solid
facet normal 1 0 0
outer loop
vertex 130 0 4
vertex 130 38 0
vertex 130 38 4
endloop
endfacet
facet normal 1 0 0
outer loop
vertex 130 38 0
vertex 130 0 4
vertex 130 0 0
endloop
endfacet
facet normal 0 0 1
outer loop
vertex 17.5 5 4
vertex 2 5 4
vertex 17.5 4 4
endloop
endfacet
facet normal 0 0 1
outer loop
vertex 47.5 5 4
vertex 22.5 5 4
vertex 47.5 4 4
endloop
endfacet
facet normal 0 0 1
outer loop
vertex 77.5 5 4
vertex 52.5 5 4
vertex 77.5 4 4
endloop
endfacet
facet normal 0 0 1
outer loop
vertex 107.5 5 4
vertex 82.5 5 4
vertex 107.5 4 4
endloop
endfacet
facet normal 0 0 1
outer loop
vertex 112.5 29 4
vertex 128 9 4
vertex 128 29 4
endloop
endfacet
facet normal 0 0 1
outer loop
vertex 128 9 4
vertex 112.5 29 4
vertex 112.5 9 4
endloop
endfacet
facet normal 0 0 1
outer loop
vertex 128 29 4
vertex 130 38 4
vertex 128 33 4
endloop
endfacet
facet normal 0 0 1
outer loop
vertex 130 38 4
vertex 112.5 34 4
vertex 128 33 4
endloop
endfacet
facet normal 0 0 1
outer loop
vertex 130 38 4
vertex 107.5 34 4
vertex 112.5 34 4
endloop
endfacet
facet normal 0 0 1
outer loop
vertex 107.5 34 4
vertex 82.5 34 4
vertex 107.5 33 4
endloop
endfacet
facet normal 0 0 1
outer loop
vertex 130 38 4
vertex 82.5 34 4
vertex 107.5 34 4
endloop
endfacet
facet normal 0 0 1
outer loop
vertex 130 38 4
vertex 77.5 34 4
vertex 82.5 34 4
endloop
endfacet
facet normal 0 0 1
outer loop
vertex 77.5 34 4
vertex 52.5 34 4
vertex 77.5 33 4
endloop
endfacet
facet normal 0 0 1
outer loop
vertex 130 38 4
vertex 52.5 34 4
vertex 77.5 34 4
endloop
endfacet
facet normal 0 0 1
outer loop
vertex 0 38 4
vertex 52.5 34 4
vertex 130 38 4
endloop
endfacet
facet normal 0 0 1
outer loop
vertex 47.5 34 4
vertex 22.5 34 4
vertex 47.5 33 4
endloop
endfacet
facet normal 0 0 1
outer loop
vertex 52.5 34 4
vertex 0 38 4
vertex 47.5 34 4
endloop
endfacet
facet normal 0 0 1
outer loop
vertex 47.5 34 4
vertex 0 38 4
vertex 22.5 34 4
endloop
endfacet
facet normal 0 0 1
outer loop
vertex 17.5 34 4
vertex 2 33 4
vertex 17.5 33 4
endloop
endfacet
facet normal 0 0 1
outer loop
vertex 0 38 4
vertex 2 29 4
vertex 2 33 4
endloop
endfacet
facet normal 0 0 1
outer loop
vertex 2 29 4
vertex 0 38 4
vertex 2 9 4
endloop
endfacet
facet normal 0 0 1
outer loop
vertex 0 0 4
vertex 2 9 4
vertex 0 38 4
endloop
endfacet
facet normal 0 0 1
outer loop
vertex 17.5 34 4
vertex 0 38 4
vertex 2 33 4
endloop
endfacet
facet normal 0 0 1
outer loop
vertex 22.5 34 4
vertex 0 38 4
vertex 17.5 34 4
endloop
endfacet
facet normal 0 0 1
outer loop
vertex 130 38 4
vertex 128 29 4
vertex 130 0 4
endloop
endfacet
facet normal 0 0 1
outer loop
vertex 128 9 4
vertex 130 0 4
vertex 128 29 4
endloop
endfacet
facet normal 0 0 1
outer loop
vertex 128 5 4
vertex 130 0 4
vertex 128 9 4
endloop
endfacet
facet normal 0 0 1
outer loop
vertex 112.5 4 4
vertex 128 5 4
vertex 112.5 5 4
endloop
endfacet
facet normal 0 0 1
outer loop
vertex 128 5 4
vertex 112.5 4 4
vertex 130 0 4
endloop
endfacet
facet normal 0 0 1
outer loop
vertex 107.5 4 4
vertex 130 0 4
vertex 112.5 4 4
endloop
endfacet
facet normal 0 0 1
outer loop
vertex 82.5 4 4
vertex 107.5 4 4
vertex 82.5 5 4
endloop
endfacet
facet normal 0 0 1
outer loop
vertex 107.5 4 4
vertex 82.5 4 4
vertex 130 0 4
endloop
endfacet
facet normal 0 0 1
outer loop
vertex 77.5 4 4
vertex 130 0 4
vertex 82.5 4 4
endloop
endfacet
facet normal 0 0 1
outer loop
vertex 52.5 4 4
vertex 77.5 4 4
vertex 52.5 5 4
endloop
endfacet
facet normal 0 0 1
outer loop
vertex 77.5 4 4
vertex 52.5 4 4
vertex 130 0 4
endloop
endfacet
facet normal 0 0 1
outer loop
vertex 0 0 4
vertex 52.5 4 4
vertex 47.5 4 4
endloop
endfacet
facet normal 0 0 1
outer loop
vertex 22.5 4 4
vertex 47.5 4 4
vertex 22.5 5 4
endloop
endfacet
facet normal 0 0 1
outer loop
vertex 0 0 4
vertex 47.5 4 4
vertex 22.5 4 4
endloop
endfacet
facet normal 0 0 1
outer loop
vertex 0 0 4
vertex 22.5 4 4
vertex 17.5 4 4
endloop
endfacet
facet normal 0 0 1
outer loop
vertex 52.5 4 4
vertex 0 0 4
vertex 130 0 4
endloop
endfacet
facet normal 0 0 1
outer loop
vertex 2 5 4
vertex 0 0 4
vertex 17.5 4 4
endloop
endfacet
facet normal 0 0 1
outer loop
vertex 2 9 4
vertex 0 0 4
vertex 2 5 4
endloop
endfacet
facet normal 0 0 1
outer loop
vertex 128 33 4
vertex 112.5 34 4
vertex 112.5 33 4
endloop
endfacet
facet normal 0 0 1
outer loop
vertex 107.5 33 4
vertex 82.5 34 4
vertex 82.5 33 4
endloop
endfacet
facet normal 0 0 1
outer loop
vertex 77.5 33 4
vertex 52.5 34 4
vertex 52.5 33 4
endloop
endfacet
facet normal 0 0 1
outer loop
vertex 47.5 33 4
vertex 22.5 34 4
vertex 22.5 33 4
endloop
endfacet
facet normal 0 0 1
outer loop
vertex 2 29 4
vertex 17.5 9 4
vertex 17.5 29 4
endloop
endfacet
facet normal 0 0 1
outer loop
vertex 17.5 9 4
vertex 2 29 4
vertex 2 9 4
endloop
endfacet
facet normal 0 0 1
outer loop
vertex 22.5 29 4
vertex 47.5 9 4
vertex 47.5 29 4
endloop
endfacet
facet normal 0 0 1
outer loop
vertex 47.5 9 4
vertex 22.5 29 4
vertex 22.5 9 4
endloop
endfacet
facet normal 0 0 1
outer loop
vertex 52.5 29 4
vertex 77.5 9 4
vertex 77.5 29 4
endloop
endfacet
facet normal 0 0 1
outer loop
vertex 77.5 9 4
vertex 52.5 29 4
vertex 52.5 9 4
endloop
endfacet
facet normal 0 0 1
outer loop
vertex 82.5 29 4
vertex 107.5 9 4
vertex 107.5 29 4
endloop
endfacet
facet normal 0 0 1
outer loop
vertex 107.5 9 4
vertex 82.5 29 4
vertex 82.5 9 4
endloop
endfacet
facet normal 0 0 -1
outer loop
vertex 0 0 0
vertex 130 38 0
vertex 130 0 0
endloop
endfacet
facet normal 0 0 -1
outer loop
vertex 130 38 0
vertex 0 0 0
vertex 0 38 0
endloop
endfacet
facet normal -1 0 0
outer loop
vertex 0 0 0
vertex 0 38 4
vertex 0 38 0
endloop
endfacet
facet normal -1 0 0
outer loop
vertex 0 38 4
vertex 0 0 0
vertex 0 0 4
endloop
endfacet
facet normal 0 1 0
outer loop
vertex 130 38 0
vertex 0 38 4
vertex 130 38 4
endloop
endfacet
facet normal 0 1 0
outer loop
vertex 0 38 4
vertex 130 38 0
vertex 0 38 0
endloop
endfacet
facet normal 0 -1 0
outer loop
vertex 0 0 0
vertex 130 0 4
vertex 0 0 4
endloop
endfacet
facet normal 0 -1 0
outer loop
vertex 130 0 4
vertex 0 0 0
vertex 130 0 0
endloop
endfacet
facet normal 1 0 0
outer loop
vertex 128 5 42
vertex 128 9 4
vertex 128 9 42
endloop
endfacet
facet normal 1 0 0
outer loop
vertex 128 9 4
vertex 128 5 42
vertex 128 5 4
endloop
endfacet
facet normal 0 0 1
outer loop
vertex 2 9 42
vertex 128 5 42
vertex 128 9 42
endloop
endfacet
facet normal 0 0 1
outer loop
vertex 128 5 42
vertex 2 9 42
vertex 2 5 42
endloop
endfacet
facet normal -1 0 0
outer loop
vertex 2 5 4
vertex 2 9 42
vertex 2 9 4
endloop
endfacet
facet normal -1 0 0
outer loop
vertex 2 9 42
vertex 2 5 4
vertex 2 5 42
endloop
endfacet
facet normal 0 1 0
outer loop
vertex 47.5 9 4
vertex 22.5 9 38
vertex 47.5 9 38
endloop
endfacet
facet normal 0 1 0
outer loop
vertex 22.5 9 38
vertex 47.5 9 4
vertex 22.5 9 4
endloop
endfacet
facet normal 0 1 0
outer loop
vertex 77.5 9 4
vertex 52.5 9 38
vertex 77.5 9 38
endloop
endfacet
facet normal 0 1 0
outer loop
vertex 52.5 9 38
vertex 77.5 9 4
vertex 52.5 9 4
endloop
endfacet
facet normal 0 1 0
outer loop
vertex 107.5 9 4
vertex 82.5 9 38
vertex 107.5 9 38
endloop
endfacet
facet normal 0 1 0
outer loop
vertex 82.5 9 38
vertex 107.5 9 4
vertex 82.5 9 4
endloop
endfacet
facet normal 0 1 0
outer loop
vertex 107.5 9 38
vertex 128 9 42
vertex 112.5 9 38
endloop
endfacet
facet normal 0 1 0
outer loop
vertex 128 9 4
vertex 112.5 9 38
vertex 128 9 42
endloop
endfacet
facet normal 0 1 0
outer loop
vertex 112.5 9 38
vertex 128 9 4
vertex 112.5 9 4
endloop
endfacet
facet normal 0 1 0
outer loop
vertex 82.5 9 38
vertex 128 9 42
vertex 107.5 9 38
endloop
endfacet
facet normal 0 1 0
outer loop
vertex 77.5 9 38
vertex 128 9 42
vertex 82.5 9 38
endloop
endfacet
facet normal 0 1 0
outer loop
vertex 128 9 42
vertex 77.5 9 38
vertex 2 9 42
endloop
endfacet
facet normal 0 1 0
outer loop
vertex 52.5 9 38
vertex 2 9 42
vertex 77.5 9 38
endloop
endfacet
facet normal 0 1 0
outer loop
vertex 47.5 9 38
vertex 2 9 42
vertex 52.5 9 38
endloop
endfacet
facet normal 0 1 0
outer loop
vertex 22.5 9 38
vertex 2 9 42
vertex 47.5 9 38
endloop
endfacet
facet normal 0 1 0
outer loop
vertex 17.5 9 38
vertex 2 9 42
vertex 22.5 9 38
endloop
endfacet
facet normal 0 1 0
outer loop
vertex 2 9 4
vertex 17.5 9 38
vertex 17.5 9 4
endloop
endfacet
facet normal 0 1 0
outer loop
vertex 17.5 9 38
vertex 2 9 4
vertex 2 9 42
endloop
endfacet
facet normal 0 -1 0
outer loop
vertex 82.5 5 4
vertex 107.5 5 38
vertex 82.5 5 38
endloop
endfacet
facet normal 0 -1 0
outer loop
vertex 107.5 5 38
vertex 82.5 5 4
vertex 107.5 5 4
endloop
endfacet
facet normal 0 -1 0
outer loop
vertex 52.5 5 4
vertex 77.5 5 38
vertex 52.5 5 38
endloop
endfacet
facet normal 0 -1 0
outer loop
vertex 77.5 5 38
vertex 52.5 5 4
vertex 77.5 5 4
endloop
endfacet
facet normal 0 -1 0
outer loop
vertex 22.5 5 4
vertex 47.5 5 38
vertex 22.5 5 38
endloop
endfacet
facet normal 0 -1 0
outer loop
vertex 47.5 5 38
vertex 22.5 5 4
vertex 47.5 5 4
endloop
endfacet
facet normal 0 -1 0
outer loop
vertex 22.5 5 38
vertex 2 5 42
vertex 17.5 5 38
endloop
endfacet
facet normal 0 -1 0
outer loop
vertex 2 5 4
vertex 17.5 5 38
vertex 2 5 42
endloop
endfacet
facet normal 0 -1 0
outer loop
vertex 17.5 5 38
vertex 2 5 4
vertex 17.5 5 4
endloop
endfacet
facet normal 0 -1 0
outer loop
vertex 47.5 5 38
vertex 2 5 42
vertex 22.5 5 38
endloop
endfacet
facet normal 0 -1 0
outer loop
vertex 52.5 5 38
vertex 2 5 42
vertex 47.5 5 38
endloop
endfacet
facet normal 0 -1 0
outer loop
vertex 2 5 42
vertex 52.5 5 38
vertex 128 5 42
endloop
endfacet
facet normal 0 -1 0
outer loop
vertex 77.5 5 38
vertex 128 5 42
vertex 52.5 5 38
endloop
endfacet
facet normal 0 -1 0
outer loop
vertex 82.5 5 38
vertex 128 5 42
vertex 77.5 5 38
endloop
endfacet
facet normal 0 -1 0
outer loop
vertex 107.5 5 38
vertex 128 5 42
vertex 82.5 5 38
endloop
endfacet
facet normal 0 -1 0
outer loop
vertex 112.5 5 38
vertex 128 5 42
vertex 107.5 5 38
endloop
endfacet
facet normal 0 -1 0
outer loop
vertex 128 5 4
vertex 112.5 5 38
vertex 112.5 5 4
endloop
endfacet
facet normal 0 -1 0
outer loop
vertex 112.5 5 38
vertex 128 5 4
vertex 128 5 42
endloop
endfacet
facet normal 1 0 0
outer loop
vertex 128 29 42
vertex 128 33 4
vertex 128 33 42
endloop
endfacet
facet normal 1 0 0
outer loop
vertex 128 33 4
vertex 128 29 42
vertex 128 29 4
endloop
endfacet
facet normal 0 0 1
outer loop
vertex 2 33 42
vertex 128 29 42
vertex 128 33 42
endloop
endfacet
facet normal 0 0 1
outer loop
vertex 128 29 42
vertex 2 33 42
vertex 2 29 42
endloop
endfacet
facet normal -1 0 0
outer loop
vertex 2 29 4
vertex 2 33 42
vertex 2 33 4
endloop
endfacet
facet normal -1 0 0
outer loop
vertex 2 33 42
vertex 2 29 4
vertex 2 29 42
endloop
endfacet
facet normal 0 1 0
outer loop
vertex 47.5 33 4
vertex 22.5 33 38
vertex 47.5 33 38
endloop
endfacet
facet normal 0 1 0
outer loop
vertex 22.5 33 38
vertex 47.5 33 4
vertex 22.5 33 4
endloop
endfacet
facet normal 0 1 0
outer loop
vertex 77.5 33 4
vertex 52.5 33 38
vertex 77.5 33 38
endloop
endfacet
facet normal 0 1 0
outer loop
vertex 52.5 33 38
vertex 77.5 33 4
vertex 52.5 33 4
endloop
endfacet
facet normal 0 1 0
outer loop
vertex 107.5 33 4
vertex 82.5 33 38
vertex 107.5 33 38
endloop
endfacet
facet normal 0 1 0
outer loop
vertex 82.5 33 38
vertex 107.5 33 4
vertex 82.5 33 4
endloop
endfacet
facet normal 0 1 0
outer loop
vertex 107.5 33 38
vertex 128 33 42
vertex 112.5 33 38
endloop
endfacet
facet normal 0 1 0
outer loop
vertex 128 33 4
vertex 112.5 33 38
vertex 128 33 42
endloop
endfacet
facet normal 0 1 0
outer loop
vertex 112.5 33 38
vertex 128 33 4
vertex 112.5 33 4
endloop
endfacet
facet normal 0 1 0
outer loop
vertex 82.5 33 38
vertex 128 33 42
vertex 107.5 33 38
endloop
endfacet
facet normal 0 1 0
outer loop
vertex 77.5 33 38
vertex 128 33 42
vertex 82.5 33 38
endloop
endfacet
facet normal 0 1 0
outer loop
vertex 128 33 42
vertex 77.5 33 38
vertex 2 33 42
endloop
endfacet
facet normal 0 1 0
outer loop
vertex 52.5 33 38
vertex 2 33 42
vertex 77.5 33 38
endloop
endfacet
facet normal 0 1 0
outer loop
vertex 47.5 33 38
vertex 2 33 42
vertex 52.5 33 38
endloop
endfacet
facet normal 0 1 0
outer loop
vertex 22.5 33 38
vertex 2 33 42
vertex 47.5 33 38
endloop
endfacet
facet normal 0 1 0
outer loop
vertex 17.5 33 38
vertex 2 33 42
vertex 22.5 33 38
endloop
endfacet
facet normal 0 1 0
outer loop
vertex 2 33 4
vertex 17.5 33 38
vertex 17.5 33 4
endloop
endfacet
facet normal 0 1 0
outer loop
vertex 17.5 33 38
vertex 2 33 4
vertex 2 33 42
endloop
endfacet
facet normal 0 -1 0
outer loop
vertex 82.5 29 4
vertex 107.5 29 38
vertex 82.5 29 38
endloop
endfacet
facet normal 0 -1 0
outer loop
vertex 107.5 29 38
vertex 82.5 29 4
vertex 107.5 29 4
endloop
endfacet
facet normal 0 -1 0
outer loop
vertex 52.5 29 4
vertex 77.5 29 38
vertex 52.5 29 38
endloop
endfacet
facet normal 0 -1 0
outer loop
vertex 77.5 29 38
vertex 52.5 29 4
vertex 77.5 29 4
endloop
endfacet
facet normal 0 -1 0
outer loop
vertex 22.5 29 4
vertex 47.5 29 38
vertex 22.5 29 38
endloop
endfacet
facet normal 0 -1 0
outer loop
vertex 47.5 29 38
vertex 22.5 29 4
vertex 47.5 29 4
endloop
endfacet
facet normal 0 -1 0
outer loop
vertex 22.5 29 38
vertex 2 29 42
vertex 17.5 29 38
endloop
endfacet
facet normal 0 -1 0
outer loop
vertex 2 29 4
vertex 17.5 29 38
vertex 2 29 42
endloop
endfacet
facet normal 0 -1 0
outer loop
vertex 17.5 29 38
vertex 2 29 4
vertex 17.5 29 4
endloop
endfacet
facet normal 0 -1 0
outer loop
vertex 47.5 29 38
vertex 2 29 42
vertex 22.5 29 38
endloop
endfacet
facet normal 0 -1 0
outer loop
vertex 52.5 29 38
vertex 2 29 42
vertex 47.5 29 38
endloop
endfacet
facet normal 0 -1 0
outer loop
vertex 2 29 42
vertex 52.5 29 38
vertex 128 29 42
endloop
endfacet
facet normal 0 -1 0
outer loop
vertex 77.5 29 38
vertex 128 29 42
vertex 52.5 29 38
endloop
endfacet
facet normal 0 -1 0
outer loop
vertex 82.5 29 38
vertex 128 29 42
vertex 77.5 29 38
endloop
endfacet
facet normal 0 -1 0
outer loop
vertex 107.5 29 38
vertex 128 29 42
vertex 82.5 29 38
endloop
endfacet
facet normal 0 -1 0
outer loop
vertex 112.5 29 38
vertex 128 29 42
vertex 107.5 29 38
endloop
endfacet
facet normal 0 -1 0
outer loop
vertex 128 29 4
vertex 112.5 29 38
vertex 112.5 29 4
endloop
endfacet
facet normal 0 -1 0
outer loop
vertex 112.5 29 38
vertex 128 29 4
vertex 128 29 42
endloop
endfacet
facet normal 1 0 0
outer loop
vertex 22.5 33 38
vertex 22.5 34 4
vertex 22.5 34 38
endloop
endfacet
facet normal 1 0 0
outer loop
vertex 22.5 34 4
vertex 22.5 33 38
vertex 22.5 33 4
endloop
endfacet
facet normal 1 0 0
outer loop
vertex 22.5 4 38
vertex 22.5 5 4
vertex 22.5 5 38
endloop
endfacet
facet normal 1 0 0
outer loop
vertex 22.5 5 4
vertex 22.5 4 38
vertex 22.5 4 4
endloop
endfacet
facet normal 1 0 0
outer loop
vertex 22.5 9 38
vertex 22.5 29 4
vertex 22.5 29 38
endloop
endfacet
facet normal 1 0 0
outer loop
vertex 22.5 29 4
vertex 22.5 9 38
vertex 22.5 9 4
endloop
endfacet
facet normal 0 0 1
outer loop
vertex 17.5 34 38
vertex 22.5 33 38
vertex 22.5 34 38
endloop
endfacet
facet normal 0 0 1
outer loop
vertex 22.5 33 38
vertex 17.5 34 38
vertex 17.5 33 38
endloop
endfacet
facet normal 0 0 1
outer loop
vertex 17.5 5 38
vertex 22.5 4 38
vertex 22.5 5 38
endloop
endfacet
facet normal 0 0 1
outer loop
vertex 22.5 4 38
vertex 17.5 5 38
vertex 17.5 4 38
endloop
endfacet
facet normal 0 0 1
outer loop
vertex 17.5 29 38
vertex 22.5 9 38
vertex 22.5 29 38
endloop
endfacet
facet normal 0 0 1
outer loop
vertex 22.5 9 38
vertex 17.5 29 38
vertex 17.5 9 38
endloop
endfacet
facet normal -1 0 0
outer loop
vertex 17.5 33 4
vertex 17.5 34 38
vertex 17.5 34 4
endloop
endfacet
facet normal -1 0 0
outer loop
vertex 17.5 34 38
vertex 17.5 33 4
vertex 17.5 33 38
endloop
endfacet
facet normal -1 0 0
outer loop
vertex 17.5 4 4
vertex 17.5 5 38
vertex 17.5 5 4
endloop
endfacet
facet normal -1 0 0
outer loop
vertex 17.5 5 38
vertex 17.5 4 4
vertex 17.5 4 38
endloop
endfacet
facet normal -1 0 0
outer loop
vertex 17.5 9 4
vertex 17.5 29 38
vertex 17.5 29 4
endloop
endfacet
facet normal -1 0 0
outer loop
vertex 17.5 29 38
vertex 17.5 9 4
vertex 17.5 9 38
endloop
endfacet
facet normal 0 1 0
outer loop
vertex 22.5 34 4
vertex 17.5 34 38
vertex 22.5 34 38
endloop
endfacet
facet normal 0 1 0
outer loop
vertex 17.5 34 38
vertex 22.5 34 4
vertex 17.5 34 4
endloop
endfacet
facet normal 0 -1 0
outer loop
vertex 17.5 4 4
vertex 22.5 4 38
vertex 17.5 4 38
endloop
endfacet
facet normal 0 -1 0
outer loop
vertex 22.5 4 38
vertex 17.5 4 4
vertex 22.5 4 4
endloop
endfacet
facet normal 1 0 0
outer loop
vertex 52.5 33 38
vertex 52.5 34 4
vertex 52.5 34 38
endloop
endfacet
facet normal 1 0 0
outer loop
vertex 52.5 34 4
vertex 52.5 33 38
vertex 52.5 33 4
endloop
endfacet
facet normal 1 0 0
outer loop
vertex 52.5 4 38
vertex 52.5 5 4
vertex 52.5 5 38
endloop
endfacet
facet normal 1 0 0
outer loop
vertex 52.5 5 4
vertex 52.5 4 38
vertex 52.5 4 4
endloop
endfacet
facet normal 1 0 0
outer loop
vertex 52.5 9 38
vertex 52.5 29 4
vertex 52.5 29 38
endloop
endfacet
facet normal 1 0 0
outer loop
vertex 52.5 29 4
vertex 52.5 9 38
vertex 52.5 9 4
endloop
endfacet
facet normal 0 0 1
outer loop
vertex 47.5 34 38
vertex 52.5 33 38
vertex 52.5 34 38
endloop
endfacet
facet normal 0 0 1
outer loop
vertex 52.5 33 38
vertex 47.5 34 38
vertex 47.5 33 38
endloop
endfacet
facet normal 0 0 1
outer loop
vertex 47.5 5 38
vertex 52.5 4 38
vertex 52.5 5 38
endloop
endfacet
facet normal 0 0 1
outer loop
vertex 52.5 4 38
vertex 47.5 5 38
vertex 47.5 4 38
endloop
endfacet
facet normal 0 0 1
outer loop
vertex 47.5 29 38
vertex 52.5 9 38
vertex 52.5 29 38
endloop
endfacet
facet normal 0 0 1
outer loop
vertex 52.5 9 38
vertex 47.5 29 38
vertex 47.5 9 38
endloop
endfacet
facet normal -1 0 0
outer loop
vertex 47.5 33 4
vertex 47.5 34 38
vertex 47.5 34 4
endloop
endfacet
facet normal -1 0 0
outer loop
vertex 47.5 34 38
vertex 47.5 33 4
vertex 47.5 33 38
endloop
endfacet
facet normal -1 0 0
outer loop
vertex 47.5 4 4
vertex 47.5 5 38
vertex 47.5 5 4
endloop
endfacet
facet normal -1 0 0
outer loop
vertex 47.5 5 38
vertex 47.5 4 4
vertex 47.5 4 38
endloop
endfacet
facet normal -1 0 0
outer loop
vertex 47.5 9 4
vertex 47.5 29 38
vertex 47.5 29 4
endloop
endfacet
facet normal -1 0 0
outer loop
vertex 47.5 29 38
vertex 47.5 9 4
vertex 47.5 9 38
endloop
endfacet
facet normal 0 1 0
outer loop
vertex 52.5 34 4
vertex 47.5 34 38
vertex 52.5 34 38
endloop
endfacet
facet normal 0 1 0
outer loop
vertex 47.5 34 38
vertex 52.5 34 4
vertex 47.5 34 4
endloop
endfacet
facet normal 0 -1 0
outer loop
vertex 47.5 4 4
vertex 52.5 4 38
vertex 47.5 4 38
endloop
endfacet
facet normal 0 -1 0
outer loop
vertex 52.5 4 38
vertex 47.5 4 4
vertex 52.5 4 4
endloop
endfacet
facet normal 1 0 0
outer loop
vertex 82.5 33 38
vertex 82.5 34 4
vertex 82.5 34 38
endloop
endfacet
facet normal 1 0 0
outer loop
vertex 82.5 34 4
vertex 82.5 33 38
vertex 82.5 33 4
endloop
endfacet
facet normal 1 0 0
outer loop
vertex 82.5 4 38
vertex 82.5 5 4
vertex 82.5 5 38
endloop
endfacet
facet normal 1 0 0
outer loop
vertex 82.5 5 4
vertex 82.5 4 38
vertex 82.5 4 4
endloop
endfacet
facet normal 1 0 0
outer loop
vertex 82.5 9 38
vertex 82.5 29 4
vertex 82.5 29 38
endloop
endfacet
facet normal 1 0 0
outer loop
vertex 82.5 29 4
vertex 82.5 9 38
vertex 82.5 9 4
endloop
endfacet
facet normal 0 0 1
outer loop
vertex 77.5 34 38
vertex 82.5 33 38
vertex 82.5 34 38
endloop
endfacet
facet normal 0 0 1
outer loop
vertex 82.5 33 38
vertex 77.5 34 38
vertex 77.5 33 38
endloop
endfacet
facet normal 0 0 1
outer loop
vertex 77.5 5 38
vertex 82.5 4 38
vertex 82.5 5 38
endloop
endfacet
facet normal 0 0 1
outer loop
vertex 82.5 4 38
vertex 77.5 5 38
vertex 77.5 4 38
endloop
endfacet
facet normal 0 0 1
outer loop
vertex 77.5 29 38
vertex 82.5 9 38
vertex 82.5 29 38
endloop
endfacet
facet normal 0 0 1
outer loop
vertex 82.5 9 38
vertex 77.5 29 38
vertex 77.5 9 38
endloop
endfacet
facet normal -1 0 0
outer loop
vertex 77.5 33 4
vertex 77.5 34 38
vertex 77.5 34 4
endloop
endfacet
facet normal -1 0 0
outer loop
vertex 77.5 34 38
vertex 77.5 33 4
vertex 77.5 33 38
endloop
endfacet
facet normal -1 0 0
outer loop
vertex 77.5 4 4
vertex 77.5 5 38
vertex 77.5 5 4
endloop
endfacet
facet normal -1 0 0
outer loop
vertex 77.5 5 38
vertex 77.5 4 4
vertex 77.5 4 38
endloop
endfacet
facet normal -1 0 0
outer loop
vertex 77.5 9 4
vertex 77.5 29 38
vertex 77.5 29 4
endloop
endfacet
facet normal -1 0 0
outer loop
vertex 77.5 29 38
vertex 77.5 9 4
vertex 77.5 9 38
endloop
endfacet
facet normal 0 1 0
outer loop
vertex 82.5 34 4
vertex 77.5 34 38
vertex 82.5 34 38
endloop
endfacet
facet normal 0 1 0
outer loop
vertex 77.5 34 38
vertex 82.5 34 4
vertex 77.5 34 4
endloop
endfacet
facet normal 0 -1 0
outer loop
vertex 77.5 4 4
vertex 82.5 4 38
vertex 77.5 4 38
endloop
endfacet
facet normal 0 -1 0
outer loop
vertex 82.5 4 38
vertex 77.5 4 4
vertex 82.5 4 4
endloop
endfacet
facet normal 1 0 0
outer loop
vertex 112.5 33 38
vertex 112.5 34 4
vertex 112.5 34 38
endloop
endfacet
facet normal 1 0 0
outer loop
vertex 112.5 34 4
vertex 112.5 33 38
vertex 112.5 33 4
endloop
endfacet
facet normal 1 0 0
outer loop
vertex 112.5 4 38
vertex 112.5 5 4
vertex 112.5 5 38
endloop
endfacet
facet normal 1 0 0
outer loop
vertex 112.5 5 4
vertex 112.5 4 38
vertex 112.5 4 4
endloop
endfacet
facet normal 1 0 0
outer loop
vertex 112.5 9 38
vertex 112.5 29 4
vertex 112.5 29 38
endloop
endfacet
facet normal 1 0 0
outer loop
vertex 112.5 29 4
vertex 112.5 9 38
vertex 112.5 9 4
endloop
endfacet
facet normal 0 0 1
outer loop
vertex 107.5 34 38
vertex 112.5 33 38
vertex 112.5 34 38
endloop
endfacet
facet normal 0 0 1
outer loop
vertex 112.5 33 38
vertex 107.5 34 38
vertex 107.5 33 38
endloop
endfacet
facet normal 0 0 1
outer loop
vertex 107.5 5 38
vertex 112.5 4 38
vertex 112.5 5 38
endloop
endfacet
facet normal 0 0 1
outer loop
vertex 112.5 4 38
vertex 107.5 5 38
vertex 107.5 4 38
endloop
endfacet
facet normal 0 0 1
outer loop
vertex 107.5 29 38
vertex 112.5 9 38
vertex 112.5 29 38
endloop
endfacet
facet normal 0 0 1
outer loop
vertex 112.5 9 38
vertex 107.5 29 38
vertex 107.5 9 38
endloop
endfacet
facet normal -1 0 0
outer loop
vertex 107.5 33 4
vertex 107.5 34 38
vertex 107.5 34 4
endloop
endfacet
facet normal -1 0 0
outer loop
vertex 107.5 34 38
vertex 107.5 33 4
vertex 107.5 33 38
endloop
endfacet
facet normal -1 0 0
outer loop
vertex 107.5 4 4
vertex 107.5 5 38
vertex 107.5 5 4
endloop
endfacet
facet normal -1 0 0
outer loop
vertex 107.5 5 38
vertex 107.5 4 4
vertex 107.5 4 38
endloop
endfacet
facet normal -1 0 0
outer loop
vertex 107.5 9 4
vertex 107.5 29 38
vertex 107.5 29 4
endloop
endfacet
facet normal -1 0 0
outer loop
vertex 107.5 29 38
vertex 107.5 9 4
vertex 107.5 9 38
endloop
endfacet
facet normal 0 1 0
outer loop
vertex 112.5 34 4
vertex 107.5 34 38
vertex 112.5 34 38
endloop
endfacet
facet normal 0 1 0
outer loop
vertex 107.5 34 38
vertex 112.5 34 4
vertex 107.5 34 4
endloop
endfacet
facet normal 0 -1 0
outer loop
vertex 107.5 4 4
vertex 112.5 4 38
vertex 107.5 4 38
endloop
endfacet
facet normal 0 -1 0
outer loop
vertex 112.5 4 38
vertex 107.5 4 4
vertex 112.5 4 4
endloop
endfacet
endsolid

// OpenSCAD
// Reference beam proxy: continuous base, two longitudinal high-I webs, and
// four transverse ties under the documented simple-support/center-load case.
union() {
	translate(v = [65.0, 19.0, 2.0]) {
		cube(center = true, size = [130.0, 38.0, 4.0]);
	}
	translate(v = [65.0, 7.0, 23.0]) {
		cube(center = true, size = [126.0, 4.0, 38.0]);
	}
	translate(v = [65.0, 31.0, 23.0]) {
		cube(center = true, size = [126.0, 4.0, 38.0]);
	}
	translate(v = [20.0, 19.0, 21.0]) {
		cube(center = true, size = [5.0, 30.0, 34.0]);
	}
	translate(v = [50.0, 19.0, 21.0]) {
		cube(center = true, size = [5.0, 30.0, 34.0]);
	}
	translate(v = [80.0, 19.0, 21.0]) {
		cube(center = true, size = [5.0, 30.0, 34.0]);
	}
	translate(v = [110.0, 19.0, 21.0]) {
		cube(center = true, size = [5.0, 30.0, 34.0]);
	}
}
